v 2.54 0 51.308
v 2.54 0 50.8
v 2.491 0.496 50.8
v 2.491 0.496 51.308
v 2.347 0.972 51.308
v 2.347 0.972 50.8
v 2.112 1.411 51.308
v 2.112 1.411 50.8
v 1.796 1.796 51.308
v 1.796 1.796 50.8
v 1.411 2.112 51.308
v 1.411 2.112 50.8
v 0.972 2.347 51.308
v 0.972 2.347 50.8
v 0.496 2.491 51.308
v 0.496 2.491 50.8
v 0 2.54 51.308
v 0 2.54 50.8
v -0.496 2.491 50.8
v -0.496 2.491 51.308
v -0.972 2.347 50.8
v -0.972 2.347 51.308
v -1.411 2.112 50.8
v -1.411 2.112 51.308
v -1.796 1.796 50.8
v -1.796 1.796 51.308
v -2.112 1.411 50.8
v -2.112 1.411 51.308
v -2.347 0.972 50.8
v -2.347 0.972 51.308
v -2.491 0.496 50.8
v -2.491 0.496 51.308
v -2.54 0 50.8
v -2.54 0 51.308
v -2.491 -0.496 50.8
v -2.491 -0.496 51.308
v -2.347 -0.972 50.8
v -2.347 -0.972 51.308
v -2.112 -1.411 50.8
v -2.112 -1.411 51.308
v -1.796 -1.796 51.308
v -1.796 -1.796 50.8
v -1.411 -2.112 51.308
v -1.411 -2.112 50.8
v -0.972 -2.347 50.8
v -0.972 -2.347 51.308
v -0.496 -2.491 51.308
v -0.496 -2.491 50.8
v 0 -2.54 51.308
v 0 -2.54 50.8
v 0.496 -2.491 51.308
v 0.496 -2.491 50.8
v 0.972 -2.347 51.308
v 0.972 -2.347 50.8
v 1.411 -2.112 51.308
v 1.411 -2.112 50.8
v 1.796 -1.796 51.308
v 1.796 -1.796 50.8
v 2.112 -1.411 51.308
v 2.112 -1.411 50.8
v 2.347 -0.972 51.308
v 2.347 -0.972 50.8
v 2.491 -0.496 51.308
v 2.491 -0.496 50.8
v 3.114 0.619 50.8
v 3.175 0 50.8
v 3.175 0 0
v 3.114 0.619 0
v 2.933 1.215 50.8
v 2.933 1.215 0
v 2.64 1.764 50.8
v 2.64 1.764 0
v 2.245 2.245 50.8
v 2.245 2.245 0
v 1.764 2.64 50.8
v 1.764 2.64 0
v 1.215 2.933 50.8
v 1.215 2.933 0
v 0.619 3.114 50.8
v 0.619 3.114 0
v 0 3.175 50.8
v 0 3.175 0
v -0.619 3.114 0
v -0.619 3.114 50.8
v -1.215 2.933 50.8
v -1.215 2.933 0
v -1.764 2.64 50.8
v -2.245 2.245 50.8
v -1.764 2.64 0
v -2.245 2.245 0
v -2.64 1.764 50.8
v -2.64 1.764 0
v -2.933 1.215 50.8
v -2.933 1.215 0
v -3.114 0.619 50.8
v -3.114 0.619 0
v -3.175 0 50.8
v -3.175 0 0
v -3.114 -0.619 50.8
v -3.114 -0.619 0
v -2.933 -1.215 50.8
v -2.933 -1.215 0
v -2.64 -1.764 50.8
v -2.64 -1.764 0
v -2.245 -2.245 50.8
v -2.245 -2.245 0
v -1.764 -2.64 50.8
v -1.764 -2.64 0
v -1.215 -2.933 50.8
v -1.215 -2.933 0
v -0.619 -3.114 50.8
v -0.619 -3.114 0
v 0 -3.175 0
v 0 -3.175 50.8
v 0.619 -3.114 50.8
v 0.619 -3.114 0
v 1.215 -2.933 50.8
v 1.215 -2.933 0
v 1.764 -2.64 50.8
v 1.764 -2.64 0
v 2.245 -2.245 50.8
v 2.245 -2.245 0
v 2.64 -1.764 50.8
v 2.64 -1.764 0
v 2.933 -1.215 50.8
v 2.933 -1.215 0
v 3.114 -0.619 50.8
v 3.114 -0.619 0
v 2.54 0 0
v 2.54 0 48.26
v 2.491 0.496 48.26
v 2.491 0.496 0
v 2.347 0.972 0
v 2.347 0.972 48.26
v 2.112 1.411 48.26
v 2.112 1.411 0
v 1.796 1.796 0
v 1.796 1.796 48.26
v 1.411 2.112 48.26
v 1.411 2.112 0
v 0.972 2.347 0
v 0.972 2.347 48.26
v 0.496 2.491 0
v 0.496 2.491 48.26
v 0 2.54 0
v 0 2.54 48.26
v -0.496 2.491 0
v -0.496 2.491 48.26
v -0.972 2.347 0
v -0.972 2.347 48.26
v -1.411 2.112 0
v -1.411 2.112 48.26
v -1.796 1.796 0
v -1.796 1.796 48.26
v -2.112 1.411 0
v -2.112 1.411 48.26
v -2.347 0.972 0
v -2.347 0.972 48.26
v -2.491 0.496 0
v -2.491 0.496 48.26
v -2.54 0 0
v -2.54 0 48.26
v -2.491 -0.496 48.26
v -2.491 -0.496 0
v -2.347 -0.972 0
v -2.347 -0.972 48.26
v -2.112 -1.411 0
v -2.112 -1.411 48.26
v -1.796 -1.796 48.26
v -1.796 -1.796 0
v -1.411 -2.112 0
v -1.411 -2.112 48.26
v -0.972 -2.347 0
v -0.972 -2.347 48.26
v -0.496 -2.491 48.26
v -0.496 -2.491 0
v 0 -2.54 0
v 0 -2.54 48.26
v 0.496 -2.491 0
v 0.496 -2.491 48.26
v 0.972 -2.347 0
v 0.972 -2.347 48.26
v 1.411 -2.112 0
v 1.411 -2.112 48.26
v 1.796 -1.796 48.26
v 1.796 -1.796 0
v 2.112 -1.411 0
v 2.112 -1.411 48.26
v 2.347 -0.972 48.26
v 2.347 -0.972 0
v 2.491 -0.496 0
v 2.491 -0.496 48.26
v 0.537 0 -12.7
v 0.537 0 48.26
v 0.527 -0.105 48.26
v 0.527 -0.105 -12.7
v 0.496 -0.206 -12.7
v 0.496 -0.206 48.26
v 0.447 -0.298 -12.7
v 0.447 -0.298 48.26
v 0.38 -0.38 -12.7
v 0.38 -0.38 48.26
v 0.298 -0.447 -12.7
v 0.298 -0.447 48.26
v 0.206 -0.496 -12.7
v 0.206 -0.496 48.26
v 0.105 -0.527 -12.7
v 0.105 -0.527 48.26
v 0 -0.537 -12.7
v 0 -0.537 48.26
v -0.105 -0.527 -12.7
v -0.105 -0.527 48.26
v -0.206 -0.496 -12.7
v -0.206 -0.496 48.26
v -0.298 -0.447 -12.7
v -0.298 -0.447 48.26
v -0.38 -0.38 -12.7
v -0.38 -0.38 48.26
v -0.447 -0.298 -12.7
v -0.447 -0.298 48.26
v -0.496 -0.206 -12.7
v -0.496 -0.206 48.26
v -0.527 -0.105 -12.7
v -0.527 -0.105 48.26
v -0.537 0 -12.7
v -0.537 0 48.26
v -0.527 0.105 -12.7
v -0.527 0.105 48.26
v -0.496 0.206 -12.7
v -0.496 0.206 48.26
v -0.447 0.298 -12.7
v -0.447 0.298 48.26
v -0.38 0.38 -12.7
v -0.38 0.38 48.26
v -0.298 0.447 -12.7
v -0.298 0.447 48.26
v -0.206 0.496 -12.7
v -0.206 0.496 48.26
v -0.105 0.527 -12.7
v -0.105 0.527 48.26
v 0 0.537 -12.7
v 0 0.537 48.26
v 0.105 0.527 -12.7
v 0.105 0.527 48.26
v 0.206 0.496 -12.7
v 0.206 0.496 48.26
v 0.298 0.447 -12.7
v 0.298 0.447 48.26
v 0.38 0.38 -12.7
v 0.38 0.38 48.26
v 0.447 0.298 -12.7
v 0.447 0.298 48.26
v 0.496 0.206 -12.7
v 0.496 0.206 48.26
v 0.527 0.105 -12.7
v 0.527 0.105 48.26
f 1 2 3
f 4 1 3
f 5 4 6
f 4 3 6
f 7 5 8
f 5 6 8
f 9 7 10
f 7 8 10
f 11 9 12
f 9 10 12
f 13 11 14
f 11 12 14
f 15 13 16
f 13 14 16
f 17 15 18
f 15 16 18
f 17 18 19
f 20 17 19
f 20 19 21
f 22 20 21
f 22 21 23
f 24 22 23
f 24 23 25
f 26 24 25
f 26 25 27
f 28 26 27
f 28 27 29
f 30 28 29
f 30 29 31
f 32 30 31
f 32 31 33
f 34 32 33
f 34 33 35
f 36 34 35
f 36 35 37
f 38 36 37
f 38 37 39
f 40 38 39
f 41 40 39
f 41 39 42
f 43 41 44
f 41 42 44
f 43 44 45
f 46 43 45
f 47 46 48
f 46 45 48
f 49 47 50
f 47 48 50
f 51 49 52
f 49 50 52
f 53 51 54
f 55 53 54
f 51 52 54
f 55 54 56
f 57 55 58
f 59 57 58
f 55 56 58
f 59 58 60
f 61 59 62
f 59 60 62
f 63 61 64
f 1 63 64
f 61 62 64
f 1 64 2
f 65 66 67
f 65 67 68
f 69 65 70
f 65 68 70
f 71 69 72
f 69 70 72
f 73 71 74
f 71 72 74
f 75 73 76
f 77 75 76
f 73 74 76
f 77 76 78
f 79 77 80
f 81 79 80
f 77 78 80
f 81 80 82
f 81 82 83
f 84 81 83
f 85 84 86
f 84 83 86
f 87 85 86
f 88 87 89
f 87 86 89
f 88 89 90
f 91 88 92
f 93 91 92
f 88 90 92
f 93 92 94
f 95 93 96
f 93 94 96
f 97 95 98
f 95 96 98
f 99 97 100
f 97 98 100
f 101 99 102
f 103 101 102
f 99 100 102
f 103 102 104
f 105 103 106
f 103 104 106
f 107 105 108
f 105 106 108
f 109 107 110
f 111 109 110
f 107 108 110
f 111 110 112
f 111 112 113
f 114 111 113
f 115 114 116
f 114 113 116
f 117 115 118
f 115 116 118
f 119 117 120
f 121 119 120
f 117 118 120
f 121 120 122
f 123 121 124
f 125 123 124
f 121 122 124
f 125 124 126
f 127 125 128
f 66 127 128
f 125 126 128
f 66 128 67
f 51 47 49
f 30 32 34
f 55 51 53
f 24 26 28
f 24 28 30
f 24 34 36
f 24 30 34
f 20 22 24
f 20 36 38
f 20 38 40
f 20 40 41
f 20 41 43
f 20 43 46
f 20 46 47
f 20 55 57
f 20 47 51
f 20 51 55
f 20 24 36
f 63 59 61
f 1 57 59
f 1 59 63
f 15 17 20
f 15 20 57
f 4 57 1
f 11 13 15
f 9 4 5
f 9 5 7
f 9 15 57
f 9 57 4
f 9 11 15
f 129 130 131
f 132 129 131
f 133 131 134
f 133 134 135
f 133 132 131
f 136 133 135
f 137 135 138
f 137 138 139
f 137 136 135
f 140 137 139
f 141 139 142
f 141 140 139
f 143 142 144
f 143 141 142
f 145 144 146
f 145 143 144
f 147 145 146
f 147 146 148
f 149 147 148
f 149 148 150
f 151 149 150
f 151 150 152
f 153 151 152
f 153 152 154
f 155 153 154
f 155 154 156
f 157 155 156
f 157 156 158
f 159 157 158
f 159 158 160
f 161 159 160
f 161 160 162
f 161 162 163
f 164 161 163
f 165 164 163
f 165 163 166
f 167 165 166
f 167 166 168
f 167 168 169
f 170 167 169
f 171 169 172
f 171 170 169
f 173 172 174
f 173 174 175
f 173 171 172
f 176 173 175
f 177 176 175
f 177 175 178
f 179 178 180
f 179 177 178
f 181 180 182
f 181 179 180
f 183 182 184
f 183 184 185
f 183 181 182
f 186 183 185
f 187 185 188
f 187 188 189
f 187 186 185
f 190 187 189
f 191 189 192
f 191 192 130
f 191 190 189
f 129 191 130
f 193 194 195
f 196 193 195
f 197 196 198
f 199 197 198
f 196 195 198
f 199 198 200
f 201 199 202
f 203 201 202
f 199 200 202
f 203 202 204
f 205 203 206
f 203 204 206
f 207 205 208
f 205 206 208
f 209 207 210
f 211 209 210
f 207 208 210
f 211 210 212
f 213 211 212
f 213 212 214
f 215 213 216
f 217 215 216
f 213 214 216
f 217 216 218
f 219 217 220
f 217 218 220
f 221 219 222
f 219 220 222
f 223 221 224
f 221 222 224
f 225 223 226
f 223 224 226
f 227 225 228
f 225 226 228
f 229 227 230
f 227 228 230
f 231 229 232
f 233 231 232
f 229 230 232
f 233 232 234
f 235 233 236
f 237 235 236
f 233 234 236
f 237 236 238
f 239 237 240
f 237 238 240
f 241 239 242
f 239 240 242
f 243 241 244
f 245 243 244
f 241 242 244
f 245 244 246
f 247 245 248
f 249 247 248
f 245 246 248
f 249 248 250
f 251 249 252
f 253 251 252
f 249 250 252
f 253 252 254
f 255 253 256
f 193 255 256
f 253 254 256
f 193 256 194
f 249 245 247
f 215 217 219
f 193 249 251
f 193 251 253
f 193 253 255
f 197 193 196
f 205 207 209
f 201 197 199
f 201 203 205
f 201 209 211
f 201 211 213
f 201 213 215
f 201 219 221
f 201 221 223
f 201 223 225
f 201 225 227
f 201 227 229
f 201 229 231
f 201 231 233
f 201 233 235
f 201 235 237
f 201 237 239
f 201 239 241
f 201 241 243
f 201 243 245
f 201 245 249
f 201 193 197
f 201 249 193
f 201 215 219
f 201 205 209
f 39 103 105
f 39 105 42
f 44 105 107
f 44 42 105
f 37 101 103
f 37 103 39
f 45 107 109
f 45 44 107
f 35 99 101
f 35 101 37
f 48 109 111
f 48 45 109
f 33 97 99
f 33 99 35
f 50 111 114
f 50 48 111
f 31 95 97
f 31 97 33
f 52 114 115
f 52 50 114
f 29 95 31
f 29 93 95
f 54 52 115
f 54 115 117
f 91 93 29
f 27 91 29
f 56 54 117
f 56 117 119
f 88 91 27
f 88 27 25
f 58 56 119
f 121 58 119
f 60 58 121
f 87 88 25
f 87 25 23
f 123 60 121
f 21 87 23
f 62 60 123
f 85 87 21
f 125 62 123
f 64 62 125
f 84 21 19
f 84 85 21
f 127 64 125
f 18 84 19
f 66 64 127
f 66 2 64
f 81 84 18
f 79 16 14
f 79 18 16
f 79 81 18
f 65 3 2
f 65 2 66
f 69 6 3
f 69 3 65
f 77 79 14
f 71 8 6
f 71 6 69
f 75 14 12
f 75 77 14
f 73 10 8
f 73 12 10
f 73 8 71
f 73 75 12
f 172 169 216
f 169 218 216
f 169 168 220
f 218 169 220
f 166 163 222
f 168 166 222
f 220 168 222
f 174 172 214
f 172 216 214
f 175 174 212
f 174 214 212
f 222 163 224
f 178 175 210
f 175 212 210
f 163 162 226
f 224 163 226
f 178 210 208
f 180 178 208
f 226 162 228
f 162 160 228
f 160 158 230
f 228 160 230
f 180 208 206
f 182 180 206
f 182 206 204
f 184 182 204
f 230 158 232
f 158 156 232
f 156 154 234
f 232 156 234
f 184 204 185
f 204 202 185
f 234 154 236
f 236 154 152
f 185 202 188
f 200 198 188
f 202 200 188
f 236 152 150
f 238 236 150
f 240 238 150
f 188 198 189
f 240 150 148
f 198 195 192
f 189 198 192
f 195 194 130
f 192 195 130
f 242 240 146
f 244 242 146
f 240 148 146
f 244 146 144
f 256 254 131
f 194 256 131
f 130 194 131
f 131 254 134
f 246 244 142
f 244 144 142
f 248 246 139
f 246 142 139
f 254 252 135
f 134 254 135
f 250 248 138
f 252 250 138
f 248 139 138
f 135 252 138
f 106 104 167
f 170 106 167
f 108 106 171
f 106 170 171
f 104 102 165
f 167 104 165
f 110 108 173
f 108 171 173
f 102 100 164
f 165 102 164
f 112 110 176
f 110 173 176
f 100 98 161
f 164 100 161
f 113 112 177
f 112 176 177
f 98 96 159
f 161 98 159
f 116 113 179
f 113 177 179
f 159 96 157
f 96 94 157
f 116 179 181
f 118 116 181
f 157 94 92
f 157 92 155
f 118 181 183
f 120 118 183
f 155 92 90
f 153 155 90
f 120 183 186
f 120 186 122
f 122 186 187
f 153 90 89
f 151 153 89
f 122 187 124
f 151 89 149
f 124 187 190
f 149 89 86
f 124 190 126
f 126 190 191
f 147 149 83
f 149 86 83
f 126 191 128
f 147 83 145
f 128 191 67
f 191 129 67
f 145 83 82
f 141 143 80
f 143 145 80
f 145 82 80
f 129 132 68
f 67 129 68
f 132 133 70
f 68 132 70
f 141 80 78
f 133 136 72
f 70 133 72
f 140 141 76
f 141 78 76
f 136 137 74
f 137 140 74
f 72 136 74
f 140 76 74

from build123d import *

# Parameters (mm, degrees)
SKETCH1_R                = 3.175
SKETCH1_R_2              = 2.54
BOSS_EXTRUDE1_DEPTH      = 50.8
BOSS_EXTRUDE2_DEPTH      = 0.508
BOSS_EXTRUDE2_DEPTH_BACK = 2.54
SKETCH2_R                = 2.54
BOSS_EXTRUDE3_START      = -48.26
SKETCH3_R                = 0.537131422
BOSS_EXTRUDE3_DEPTH      = 60.96


with BuildPart() as part:
    # Sketch1 → Boss-Extrude1 (new body)
    with BuildSketch(Plane.XY):
        Circle(SKETCH1_R)
        Circle(SKETCH1_R_2, mode=Mode.SUBTRACT)
    extrude(amount=BOSS_EXTRUDE1_DEPTH)

    # Sketch2 → Boss-Extrude2 (add, two sides: drawn at the far end of the back side and taken through both)
    with BuildSketch(Plane.XY.offset(50.8).offset(-BOSS_EXTRUDE2_DEPTH_BACK)):
        Circle(SKETCH2_R)
    extrude(amount=BOSS_EXTRUDE2_DEPTH + BOSS_EXTRUDE2_DEPTH_BACK)

    # Sketch3 → Boss-Extrude3 (add)
    with BuildSketch(Plane(origin=(0, 0, 0), x_dir=(-1, 0, 0), z_dir=(0, 0, -1)).offset(BOSS_EXTRUDE3_START)):
        with Locations(Location((0, 0, 0), (0, 0, 180))):
            Circle(SKETCH3_R)
    extrude(amount=BOSS_EXTRUDE3_DEPTH)


solid = part.part
